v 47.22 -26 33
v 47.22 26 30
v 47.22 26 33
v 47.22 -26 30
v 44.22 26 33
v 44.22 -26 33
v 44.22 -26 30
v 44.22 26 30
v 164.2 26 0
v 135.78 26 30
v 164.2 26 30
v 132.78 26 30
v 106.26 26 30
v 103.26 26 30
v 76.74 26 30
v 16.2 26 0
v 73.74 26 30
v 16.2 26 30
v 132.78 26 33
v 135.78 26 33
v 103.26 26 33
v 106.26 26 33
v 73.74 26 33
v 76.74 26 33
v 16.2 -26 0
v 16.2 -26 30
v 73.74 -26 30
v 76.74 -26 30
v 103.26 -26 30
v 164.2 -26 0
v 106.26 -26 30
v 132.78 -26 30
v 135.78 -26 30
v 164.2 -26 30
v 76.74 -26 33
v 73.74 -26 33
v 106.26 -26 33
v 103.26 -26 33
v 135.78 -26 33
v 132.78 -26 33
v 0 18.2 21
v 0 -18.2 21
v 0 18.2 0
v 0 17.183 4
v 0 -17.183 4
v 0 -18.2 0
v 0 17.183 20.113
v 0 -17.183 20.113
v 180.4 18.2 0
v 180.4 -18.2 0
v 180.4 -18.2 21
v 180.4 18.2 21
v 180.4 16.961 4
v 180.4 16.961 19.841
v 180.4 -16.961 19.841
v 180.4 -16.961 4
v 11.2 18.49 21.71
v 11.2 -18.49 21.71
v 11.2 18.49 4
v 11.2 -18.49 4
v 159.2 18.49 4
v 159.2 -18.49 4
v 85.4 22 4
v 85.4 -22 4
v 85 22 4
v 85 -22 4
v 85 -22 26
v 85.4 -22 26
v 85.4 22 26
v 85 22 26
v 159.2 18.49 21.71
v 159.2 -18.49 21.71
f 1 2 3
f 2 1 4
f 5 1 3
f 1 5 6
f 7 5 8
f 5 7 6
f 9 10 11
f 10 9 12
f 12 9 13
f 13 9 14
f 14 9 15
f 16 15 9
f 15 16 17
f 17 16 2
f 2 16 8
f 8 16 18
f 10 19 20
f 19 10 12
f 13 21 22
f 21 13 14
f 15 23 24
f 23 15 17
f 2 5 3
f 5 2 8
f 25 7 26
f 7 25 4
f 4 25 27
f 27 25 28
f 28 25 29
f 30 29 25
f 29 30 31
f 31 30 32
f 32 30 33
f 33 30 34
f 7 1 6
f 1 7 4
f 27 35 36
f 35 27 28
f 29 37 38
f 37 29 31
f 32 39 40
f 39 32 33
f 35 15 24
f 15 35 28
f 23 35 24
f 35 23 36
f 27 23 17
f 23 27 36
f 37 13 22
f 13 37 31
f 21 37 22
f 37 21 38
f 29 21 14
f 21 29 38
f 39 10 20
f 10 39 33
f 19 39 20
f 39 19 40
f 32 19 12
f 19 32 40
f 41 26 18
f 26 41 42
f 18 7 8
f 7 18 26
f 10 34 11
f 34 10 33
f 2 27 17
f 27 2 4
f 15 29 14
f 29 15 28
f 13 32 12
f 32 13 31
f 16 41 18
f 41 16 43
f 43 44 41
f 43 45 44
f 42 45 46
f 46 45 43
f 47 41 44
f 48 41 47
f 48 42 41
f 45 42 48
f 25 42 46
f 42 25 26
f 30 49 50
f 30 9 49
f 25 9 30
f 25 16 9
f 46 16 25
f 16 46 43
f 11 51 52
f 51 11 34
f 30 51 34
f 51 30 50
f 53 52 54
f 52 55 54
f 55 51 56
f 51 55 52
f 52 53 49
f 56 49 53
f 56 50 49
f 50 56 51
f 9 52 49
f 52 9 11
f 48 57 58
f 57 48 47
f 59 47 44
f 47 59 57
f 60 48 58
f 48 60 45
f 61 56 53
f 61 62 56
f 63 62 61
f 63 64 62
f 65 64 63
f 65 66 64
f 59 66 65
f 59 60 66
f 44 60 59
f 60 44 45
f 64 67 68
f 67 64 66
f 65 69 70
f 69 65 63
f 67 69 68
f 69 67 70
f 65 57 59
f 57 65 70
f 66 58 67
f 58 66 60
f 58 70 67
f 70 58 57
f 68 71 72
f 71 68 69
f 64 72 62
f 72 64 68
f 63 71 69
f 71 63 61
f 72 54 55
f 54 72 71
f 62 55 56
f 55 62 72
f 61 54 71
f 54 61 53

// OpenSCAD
$fn = 32;

// ----------------------------------------------------------------------
// Faired channel: 180 x 52 x 30 mm, 4 mm walls, faired ends
// ----------------------------------------------------------------------

// --- parameters (mm) ---
length = 180;             // channel length
width = 52;               // channel width at mid length
height = 30;              // channel height at mid length
wall = 4;                 // side wall thickness
floor_t = 4;              // floor thickness
end_w = 36.4;             // faired end width
end_h = 21;               // faired end height
ribs = 4;                 // stiffening ribs on the top
rib_t = 3;                // rib thickness
rib_h = 3;                // rib height

difference() {
  union() {
    hull() {
      translate([0, -18.2, 0]) cube([0.4, 36.4, 21]);
      translate([16.2, -26, 0]) cube([0.4, 52, 30]);
    }
    hull() {
      translate([16.2, -26, 0]) cube([0.4, 52, 30]);
      translate([90, -26, 0]) cube([0.4, 52, 30]);
    }
    hull() {
      translate([90, -26, 0]) cube([0.4, 52, 30]);
      translate([163.8, -26, 0]) cube([0.4, 52, 30]);
    }
    hull() {
      translate([163.8, -26, 0]) cube([0.4, 52, 30]);
      translate([180, -18.2, 0]) cube([0.4, 36.4, 21]);
    }
    /* stiffening ribs across the flat top, sunk 0.8 mm into it */
    for (i = [1 : ribs]) {
      translate([16.2 + i * (length - 2 * 16.2) / (ribs + 1) - rib_t / 2, -width / 2, height - 0.8]) cube([rib_t, width, rib_h + 0.8]);
    }
  }
  /* cavity, 5 mm proud of both ends so the ports are cut clean */
  hull() {
    translate([-5, -16.6, 4]) cube([0.4, 33.2, 15.4]);
    translate([11.2, -18.49, 4]) cube([0.4, 36.98, 17.71]);
  }
  hull() {
    translate([11.2, -18.49, 4]) cube([0.4, 36.98, 17.71]);
    translate([85, -22, 4]) cube([0.4, 44, 22]);
  }
  hull() {
    translate([85, -22, 4]) cube([0.4, 44, 22]);
    translate([158.8, -18.49, 4]) cube([0.4, 36.98, 17.71]);
  }
  hull() {
    translate([158.8, -18.49, 4]) cube([0.4, 36.98, 17.71]);
    translate([185, -16.6, 4]) cube([0.4, 33.2, 15.4]);
  }
}
